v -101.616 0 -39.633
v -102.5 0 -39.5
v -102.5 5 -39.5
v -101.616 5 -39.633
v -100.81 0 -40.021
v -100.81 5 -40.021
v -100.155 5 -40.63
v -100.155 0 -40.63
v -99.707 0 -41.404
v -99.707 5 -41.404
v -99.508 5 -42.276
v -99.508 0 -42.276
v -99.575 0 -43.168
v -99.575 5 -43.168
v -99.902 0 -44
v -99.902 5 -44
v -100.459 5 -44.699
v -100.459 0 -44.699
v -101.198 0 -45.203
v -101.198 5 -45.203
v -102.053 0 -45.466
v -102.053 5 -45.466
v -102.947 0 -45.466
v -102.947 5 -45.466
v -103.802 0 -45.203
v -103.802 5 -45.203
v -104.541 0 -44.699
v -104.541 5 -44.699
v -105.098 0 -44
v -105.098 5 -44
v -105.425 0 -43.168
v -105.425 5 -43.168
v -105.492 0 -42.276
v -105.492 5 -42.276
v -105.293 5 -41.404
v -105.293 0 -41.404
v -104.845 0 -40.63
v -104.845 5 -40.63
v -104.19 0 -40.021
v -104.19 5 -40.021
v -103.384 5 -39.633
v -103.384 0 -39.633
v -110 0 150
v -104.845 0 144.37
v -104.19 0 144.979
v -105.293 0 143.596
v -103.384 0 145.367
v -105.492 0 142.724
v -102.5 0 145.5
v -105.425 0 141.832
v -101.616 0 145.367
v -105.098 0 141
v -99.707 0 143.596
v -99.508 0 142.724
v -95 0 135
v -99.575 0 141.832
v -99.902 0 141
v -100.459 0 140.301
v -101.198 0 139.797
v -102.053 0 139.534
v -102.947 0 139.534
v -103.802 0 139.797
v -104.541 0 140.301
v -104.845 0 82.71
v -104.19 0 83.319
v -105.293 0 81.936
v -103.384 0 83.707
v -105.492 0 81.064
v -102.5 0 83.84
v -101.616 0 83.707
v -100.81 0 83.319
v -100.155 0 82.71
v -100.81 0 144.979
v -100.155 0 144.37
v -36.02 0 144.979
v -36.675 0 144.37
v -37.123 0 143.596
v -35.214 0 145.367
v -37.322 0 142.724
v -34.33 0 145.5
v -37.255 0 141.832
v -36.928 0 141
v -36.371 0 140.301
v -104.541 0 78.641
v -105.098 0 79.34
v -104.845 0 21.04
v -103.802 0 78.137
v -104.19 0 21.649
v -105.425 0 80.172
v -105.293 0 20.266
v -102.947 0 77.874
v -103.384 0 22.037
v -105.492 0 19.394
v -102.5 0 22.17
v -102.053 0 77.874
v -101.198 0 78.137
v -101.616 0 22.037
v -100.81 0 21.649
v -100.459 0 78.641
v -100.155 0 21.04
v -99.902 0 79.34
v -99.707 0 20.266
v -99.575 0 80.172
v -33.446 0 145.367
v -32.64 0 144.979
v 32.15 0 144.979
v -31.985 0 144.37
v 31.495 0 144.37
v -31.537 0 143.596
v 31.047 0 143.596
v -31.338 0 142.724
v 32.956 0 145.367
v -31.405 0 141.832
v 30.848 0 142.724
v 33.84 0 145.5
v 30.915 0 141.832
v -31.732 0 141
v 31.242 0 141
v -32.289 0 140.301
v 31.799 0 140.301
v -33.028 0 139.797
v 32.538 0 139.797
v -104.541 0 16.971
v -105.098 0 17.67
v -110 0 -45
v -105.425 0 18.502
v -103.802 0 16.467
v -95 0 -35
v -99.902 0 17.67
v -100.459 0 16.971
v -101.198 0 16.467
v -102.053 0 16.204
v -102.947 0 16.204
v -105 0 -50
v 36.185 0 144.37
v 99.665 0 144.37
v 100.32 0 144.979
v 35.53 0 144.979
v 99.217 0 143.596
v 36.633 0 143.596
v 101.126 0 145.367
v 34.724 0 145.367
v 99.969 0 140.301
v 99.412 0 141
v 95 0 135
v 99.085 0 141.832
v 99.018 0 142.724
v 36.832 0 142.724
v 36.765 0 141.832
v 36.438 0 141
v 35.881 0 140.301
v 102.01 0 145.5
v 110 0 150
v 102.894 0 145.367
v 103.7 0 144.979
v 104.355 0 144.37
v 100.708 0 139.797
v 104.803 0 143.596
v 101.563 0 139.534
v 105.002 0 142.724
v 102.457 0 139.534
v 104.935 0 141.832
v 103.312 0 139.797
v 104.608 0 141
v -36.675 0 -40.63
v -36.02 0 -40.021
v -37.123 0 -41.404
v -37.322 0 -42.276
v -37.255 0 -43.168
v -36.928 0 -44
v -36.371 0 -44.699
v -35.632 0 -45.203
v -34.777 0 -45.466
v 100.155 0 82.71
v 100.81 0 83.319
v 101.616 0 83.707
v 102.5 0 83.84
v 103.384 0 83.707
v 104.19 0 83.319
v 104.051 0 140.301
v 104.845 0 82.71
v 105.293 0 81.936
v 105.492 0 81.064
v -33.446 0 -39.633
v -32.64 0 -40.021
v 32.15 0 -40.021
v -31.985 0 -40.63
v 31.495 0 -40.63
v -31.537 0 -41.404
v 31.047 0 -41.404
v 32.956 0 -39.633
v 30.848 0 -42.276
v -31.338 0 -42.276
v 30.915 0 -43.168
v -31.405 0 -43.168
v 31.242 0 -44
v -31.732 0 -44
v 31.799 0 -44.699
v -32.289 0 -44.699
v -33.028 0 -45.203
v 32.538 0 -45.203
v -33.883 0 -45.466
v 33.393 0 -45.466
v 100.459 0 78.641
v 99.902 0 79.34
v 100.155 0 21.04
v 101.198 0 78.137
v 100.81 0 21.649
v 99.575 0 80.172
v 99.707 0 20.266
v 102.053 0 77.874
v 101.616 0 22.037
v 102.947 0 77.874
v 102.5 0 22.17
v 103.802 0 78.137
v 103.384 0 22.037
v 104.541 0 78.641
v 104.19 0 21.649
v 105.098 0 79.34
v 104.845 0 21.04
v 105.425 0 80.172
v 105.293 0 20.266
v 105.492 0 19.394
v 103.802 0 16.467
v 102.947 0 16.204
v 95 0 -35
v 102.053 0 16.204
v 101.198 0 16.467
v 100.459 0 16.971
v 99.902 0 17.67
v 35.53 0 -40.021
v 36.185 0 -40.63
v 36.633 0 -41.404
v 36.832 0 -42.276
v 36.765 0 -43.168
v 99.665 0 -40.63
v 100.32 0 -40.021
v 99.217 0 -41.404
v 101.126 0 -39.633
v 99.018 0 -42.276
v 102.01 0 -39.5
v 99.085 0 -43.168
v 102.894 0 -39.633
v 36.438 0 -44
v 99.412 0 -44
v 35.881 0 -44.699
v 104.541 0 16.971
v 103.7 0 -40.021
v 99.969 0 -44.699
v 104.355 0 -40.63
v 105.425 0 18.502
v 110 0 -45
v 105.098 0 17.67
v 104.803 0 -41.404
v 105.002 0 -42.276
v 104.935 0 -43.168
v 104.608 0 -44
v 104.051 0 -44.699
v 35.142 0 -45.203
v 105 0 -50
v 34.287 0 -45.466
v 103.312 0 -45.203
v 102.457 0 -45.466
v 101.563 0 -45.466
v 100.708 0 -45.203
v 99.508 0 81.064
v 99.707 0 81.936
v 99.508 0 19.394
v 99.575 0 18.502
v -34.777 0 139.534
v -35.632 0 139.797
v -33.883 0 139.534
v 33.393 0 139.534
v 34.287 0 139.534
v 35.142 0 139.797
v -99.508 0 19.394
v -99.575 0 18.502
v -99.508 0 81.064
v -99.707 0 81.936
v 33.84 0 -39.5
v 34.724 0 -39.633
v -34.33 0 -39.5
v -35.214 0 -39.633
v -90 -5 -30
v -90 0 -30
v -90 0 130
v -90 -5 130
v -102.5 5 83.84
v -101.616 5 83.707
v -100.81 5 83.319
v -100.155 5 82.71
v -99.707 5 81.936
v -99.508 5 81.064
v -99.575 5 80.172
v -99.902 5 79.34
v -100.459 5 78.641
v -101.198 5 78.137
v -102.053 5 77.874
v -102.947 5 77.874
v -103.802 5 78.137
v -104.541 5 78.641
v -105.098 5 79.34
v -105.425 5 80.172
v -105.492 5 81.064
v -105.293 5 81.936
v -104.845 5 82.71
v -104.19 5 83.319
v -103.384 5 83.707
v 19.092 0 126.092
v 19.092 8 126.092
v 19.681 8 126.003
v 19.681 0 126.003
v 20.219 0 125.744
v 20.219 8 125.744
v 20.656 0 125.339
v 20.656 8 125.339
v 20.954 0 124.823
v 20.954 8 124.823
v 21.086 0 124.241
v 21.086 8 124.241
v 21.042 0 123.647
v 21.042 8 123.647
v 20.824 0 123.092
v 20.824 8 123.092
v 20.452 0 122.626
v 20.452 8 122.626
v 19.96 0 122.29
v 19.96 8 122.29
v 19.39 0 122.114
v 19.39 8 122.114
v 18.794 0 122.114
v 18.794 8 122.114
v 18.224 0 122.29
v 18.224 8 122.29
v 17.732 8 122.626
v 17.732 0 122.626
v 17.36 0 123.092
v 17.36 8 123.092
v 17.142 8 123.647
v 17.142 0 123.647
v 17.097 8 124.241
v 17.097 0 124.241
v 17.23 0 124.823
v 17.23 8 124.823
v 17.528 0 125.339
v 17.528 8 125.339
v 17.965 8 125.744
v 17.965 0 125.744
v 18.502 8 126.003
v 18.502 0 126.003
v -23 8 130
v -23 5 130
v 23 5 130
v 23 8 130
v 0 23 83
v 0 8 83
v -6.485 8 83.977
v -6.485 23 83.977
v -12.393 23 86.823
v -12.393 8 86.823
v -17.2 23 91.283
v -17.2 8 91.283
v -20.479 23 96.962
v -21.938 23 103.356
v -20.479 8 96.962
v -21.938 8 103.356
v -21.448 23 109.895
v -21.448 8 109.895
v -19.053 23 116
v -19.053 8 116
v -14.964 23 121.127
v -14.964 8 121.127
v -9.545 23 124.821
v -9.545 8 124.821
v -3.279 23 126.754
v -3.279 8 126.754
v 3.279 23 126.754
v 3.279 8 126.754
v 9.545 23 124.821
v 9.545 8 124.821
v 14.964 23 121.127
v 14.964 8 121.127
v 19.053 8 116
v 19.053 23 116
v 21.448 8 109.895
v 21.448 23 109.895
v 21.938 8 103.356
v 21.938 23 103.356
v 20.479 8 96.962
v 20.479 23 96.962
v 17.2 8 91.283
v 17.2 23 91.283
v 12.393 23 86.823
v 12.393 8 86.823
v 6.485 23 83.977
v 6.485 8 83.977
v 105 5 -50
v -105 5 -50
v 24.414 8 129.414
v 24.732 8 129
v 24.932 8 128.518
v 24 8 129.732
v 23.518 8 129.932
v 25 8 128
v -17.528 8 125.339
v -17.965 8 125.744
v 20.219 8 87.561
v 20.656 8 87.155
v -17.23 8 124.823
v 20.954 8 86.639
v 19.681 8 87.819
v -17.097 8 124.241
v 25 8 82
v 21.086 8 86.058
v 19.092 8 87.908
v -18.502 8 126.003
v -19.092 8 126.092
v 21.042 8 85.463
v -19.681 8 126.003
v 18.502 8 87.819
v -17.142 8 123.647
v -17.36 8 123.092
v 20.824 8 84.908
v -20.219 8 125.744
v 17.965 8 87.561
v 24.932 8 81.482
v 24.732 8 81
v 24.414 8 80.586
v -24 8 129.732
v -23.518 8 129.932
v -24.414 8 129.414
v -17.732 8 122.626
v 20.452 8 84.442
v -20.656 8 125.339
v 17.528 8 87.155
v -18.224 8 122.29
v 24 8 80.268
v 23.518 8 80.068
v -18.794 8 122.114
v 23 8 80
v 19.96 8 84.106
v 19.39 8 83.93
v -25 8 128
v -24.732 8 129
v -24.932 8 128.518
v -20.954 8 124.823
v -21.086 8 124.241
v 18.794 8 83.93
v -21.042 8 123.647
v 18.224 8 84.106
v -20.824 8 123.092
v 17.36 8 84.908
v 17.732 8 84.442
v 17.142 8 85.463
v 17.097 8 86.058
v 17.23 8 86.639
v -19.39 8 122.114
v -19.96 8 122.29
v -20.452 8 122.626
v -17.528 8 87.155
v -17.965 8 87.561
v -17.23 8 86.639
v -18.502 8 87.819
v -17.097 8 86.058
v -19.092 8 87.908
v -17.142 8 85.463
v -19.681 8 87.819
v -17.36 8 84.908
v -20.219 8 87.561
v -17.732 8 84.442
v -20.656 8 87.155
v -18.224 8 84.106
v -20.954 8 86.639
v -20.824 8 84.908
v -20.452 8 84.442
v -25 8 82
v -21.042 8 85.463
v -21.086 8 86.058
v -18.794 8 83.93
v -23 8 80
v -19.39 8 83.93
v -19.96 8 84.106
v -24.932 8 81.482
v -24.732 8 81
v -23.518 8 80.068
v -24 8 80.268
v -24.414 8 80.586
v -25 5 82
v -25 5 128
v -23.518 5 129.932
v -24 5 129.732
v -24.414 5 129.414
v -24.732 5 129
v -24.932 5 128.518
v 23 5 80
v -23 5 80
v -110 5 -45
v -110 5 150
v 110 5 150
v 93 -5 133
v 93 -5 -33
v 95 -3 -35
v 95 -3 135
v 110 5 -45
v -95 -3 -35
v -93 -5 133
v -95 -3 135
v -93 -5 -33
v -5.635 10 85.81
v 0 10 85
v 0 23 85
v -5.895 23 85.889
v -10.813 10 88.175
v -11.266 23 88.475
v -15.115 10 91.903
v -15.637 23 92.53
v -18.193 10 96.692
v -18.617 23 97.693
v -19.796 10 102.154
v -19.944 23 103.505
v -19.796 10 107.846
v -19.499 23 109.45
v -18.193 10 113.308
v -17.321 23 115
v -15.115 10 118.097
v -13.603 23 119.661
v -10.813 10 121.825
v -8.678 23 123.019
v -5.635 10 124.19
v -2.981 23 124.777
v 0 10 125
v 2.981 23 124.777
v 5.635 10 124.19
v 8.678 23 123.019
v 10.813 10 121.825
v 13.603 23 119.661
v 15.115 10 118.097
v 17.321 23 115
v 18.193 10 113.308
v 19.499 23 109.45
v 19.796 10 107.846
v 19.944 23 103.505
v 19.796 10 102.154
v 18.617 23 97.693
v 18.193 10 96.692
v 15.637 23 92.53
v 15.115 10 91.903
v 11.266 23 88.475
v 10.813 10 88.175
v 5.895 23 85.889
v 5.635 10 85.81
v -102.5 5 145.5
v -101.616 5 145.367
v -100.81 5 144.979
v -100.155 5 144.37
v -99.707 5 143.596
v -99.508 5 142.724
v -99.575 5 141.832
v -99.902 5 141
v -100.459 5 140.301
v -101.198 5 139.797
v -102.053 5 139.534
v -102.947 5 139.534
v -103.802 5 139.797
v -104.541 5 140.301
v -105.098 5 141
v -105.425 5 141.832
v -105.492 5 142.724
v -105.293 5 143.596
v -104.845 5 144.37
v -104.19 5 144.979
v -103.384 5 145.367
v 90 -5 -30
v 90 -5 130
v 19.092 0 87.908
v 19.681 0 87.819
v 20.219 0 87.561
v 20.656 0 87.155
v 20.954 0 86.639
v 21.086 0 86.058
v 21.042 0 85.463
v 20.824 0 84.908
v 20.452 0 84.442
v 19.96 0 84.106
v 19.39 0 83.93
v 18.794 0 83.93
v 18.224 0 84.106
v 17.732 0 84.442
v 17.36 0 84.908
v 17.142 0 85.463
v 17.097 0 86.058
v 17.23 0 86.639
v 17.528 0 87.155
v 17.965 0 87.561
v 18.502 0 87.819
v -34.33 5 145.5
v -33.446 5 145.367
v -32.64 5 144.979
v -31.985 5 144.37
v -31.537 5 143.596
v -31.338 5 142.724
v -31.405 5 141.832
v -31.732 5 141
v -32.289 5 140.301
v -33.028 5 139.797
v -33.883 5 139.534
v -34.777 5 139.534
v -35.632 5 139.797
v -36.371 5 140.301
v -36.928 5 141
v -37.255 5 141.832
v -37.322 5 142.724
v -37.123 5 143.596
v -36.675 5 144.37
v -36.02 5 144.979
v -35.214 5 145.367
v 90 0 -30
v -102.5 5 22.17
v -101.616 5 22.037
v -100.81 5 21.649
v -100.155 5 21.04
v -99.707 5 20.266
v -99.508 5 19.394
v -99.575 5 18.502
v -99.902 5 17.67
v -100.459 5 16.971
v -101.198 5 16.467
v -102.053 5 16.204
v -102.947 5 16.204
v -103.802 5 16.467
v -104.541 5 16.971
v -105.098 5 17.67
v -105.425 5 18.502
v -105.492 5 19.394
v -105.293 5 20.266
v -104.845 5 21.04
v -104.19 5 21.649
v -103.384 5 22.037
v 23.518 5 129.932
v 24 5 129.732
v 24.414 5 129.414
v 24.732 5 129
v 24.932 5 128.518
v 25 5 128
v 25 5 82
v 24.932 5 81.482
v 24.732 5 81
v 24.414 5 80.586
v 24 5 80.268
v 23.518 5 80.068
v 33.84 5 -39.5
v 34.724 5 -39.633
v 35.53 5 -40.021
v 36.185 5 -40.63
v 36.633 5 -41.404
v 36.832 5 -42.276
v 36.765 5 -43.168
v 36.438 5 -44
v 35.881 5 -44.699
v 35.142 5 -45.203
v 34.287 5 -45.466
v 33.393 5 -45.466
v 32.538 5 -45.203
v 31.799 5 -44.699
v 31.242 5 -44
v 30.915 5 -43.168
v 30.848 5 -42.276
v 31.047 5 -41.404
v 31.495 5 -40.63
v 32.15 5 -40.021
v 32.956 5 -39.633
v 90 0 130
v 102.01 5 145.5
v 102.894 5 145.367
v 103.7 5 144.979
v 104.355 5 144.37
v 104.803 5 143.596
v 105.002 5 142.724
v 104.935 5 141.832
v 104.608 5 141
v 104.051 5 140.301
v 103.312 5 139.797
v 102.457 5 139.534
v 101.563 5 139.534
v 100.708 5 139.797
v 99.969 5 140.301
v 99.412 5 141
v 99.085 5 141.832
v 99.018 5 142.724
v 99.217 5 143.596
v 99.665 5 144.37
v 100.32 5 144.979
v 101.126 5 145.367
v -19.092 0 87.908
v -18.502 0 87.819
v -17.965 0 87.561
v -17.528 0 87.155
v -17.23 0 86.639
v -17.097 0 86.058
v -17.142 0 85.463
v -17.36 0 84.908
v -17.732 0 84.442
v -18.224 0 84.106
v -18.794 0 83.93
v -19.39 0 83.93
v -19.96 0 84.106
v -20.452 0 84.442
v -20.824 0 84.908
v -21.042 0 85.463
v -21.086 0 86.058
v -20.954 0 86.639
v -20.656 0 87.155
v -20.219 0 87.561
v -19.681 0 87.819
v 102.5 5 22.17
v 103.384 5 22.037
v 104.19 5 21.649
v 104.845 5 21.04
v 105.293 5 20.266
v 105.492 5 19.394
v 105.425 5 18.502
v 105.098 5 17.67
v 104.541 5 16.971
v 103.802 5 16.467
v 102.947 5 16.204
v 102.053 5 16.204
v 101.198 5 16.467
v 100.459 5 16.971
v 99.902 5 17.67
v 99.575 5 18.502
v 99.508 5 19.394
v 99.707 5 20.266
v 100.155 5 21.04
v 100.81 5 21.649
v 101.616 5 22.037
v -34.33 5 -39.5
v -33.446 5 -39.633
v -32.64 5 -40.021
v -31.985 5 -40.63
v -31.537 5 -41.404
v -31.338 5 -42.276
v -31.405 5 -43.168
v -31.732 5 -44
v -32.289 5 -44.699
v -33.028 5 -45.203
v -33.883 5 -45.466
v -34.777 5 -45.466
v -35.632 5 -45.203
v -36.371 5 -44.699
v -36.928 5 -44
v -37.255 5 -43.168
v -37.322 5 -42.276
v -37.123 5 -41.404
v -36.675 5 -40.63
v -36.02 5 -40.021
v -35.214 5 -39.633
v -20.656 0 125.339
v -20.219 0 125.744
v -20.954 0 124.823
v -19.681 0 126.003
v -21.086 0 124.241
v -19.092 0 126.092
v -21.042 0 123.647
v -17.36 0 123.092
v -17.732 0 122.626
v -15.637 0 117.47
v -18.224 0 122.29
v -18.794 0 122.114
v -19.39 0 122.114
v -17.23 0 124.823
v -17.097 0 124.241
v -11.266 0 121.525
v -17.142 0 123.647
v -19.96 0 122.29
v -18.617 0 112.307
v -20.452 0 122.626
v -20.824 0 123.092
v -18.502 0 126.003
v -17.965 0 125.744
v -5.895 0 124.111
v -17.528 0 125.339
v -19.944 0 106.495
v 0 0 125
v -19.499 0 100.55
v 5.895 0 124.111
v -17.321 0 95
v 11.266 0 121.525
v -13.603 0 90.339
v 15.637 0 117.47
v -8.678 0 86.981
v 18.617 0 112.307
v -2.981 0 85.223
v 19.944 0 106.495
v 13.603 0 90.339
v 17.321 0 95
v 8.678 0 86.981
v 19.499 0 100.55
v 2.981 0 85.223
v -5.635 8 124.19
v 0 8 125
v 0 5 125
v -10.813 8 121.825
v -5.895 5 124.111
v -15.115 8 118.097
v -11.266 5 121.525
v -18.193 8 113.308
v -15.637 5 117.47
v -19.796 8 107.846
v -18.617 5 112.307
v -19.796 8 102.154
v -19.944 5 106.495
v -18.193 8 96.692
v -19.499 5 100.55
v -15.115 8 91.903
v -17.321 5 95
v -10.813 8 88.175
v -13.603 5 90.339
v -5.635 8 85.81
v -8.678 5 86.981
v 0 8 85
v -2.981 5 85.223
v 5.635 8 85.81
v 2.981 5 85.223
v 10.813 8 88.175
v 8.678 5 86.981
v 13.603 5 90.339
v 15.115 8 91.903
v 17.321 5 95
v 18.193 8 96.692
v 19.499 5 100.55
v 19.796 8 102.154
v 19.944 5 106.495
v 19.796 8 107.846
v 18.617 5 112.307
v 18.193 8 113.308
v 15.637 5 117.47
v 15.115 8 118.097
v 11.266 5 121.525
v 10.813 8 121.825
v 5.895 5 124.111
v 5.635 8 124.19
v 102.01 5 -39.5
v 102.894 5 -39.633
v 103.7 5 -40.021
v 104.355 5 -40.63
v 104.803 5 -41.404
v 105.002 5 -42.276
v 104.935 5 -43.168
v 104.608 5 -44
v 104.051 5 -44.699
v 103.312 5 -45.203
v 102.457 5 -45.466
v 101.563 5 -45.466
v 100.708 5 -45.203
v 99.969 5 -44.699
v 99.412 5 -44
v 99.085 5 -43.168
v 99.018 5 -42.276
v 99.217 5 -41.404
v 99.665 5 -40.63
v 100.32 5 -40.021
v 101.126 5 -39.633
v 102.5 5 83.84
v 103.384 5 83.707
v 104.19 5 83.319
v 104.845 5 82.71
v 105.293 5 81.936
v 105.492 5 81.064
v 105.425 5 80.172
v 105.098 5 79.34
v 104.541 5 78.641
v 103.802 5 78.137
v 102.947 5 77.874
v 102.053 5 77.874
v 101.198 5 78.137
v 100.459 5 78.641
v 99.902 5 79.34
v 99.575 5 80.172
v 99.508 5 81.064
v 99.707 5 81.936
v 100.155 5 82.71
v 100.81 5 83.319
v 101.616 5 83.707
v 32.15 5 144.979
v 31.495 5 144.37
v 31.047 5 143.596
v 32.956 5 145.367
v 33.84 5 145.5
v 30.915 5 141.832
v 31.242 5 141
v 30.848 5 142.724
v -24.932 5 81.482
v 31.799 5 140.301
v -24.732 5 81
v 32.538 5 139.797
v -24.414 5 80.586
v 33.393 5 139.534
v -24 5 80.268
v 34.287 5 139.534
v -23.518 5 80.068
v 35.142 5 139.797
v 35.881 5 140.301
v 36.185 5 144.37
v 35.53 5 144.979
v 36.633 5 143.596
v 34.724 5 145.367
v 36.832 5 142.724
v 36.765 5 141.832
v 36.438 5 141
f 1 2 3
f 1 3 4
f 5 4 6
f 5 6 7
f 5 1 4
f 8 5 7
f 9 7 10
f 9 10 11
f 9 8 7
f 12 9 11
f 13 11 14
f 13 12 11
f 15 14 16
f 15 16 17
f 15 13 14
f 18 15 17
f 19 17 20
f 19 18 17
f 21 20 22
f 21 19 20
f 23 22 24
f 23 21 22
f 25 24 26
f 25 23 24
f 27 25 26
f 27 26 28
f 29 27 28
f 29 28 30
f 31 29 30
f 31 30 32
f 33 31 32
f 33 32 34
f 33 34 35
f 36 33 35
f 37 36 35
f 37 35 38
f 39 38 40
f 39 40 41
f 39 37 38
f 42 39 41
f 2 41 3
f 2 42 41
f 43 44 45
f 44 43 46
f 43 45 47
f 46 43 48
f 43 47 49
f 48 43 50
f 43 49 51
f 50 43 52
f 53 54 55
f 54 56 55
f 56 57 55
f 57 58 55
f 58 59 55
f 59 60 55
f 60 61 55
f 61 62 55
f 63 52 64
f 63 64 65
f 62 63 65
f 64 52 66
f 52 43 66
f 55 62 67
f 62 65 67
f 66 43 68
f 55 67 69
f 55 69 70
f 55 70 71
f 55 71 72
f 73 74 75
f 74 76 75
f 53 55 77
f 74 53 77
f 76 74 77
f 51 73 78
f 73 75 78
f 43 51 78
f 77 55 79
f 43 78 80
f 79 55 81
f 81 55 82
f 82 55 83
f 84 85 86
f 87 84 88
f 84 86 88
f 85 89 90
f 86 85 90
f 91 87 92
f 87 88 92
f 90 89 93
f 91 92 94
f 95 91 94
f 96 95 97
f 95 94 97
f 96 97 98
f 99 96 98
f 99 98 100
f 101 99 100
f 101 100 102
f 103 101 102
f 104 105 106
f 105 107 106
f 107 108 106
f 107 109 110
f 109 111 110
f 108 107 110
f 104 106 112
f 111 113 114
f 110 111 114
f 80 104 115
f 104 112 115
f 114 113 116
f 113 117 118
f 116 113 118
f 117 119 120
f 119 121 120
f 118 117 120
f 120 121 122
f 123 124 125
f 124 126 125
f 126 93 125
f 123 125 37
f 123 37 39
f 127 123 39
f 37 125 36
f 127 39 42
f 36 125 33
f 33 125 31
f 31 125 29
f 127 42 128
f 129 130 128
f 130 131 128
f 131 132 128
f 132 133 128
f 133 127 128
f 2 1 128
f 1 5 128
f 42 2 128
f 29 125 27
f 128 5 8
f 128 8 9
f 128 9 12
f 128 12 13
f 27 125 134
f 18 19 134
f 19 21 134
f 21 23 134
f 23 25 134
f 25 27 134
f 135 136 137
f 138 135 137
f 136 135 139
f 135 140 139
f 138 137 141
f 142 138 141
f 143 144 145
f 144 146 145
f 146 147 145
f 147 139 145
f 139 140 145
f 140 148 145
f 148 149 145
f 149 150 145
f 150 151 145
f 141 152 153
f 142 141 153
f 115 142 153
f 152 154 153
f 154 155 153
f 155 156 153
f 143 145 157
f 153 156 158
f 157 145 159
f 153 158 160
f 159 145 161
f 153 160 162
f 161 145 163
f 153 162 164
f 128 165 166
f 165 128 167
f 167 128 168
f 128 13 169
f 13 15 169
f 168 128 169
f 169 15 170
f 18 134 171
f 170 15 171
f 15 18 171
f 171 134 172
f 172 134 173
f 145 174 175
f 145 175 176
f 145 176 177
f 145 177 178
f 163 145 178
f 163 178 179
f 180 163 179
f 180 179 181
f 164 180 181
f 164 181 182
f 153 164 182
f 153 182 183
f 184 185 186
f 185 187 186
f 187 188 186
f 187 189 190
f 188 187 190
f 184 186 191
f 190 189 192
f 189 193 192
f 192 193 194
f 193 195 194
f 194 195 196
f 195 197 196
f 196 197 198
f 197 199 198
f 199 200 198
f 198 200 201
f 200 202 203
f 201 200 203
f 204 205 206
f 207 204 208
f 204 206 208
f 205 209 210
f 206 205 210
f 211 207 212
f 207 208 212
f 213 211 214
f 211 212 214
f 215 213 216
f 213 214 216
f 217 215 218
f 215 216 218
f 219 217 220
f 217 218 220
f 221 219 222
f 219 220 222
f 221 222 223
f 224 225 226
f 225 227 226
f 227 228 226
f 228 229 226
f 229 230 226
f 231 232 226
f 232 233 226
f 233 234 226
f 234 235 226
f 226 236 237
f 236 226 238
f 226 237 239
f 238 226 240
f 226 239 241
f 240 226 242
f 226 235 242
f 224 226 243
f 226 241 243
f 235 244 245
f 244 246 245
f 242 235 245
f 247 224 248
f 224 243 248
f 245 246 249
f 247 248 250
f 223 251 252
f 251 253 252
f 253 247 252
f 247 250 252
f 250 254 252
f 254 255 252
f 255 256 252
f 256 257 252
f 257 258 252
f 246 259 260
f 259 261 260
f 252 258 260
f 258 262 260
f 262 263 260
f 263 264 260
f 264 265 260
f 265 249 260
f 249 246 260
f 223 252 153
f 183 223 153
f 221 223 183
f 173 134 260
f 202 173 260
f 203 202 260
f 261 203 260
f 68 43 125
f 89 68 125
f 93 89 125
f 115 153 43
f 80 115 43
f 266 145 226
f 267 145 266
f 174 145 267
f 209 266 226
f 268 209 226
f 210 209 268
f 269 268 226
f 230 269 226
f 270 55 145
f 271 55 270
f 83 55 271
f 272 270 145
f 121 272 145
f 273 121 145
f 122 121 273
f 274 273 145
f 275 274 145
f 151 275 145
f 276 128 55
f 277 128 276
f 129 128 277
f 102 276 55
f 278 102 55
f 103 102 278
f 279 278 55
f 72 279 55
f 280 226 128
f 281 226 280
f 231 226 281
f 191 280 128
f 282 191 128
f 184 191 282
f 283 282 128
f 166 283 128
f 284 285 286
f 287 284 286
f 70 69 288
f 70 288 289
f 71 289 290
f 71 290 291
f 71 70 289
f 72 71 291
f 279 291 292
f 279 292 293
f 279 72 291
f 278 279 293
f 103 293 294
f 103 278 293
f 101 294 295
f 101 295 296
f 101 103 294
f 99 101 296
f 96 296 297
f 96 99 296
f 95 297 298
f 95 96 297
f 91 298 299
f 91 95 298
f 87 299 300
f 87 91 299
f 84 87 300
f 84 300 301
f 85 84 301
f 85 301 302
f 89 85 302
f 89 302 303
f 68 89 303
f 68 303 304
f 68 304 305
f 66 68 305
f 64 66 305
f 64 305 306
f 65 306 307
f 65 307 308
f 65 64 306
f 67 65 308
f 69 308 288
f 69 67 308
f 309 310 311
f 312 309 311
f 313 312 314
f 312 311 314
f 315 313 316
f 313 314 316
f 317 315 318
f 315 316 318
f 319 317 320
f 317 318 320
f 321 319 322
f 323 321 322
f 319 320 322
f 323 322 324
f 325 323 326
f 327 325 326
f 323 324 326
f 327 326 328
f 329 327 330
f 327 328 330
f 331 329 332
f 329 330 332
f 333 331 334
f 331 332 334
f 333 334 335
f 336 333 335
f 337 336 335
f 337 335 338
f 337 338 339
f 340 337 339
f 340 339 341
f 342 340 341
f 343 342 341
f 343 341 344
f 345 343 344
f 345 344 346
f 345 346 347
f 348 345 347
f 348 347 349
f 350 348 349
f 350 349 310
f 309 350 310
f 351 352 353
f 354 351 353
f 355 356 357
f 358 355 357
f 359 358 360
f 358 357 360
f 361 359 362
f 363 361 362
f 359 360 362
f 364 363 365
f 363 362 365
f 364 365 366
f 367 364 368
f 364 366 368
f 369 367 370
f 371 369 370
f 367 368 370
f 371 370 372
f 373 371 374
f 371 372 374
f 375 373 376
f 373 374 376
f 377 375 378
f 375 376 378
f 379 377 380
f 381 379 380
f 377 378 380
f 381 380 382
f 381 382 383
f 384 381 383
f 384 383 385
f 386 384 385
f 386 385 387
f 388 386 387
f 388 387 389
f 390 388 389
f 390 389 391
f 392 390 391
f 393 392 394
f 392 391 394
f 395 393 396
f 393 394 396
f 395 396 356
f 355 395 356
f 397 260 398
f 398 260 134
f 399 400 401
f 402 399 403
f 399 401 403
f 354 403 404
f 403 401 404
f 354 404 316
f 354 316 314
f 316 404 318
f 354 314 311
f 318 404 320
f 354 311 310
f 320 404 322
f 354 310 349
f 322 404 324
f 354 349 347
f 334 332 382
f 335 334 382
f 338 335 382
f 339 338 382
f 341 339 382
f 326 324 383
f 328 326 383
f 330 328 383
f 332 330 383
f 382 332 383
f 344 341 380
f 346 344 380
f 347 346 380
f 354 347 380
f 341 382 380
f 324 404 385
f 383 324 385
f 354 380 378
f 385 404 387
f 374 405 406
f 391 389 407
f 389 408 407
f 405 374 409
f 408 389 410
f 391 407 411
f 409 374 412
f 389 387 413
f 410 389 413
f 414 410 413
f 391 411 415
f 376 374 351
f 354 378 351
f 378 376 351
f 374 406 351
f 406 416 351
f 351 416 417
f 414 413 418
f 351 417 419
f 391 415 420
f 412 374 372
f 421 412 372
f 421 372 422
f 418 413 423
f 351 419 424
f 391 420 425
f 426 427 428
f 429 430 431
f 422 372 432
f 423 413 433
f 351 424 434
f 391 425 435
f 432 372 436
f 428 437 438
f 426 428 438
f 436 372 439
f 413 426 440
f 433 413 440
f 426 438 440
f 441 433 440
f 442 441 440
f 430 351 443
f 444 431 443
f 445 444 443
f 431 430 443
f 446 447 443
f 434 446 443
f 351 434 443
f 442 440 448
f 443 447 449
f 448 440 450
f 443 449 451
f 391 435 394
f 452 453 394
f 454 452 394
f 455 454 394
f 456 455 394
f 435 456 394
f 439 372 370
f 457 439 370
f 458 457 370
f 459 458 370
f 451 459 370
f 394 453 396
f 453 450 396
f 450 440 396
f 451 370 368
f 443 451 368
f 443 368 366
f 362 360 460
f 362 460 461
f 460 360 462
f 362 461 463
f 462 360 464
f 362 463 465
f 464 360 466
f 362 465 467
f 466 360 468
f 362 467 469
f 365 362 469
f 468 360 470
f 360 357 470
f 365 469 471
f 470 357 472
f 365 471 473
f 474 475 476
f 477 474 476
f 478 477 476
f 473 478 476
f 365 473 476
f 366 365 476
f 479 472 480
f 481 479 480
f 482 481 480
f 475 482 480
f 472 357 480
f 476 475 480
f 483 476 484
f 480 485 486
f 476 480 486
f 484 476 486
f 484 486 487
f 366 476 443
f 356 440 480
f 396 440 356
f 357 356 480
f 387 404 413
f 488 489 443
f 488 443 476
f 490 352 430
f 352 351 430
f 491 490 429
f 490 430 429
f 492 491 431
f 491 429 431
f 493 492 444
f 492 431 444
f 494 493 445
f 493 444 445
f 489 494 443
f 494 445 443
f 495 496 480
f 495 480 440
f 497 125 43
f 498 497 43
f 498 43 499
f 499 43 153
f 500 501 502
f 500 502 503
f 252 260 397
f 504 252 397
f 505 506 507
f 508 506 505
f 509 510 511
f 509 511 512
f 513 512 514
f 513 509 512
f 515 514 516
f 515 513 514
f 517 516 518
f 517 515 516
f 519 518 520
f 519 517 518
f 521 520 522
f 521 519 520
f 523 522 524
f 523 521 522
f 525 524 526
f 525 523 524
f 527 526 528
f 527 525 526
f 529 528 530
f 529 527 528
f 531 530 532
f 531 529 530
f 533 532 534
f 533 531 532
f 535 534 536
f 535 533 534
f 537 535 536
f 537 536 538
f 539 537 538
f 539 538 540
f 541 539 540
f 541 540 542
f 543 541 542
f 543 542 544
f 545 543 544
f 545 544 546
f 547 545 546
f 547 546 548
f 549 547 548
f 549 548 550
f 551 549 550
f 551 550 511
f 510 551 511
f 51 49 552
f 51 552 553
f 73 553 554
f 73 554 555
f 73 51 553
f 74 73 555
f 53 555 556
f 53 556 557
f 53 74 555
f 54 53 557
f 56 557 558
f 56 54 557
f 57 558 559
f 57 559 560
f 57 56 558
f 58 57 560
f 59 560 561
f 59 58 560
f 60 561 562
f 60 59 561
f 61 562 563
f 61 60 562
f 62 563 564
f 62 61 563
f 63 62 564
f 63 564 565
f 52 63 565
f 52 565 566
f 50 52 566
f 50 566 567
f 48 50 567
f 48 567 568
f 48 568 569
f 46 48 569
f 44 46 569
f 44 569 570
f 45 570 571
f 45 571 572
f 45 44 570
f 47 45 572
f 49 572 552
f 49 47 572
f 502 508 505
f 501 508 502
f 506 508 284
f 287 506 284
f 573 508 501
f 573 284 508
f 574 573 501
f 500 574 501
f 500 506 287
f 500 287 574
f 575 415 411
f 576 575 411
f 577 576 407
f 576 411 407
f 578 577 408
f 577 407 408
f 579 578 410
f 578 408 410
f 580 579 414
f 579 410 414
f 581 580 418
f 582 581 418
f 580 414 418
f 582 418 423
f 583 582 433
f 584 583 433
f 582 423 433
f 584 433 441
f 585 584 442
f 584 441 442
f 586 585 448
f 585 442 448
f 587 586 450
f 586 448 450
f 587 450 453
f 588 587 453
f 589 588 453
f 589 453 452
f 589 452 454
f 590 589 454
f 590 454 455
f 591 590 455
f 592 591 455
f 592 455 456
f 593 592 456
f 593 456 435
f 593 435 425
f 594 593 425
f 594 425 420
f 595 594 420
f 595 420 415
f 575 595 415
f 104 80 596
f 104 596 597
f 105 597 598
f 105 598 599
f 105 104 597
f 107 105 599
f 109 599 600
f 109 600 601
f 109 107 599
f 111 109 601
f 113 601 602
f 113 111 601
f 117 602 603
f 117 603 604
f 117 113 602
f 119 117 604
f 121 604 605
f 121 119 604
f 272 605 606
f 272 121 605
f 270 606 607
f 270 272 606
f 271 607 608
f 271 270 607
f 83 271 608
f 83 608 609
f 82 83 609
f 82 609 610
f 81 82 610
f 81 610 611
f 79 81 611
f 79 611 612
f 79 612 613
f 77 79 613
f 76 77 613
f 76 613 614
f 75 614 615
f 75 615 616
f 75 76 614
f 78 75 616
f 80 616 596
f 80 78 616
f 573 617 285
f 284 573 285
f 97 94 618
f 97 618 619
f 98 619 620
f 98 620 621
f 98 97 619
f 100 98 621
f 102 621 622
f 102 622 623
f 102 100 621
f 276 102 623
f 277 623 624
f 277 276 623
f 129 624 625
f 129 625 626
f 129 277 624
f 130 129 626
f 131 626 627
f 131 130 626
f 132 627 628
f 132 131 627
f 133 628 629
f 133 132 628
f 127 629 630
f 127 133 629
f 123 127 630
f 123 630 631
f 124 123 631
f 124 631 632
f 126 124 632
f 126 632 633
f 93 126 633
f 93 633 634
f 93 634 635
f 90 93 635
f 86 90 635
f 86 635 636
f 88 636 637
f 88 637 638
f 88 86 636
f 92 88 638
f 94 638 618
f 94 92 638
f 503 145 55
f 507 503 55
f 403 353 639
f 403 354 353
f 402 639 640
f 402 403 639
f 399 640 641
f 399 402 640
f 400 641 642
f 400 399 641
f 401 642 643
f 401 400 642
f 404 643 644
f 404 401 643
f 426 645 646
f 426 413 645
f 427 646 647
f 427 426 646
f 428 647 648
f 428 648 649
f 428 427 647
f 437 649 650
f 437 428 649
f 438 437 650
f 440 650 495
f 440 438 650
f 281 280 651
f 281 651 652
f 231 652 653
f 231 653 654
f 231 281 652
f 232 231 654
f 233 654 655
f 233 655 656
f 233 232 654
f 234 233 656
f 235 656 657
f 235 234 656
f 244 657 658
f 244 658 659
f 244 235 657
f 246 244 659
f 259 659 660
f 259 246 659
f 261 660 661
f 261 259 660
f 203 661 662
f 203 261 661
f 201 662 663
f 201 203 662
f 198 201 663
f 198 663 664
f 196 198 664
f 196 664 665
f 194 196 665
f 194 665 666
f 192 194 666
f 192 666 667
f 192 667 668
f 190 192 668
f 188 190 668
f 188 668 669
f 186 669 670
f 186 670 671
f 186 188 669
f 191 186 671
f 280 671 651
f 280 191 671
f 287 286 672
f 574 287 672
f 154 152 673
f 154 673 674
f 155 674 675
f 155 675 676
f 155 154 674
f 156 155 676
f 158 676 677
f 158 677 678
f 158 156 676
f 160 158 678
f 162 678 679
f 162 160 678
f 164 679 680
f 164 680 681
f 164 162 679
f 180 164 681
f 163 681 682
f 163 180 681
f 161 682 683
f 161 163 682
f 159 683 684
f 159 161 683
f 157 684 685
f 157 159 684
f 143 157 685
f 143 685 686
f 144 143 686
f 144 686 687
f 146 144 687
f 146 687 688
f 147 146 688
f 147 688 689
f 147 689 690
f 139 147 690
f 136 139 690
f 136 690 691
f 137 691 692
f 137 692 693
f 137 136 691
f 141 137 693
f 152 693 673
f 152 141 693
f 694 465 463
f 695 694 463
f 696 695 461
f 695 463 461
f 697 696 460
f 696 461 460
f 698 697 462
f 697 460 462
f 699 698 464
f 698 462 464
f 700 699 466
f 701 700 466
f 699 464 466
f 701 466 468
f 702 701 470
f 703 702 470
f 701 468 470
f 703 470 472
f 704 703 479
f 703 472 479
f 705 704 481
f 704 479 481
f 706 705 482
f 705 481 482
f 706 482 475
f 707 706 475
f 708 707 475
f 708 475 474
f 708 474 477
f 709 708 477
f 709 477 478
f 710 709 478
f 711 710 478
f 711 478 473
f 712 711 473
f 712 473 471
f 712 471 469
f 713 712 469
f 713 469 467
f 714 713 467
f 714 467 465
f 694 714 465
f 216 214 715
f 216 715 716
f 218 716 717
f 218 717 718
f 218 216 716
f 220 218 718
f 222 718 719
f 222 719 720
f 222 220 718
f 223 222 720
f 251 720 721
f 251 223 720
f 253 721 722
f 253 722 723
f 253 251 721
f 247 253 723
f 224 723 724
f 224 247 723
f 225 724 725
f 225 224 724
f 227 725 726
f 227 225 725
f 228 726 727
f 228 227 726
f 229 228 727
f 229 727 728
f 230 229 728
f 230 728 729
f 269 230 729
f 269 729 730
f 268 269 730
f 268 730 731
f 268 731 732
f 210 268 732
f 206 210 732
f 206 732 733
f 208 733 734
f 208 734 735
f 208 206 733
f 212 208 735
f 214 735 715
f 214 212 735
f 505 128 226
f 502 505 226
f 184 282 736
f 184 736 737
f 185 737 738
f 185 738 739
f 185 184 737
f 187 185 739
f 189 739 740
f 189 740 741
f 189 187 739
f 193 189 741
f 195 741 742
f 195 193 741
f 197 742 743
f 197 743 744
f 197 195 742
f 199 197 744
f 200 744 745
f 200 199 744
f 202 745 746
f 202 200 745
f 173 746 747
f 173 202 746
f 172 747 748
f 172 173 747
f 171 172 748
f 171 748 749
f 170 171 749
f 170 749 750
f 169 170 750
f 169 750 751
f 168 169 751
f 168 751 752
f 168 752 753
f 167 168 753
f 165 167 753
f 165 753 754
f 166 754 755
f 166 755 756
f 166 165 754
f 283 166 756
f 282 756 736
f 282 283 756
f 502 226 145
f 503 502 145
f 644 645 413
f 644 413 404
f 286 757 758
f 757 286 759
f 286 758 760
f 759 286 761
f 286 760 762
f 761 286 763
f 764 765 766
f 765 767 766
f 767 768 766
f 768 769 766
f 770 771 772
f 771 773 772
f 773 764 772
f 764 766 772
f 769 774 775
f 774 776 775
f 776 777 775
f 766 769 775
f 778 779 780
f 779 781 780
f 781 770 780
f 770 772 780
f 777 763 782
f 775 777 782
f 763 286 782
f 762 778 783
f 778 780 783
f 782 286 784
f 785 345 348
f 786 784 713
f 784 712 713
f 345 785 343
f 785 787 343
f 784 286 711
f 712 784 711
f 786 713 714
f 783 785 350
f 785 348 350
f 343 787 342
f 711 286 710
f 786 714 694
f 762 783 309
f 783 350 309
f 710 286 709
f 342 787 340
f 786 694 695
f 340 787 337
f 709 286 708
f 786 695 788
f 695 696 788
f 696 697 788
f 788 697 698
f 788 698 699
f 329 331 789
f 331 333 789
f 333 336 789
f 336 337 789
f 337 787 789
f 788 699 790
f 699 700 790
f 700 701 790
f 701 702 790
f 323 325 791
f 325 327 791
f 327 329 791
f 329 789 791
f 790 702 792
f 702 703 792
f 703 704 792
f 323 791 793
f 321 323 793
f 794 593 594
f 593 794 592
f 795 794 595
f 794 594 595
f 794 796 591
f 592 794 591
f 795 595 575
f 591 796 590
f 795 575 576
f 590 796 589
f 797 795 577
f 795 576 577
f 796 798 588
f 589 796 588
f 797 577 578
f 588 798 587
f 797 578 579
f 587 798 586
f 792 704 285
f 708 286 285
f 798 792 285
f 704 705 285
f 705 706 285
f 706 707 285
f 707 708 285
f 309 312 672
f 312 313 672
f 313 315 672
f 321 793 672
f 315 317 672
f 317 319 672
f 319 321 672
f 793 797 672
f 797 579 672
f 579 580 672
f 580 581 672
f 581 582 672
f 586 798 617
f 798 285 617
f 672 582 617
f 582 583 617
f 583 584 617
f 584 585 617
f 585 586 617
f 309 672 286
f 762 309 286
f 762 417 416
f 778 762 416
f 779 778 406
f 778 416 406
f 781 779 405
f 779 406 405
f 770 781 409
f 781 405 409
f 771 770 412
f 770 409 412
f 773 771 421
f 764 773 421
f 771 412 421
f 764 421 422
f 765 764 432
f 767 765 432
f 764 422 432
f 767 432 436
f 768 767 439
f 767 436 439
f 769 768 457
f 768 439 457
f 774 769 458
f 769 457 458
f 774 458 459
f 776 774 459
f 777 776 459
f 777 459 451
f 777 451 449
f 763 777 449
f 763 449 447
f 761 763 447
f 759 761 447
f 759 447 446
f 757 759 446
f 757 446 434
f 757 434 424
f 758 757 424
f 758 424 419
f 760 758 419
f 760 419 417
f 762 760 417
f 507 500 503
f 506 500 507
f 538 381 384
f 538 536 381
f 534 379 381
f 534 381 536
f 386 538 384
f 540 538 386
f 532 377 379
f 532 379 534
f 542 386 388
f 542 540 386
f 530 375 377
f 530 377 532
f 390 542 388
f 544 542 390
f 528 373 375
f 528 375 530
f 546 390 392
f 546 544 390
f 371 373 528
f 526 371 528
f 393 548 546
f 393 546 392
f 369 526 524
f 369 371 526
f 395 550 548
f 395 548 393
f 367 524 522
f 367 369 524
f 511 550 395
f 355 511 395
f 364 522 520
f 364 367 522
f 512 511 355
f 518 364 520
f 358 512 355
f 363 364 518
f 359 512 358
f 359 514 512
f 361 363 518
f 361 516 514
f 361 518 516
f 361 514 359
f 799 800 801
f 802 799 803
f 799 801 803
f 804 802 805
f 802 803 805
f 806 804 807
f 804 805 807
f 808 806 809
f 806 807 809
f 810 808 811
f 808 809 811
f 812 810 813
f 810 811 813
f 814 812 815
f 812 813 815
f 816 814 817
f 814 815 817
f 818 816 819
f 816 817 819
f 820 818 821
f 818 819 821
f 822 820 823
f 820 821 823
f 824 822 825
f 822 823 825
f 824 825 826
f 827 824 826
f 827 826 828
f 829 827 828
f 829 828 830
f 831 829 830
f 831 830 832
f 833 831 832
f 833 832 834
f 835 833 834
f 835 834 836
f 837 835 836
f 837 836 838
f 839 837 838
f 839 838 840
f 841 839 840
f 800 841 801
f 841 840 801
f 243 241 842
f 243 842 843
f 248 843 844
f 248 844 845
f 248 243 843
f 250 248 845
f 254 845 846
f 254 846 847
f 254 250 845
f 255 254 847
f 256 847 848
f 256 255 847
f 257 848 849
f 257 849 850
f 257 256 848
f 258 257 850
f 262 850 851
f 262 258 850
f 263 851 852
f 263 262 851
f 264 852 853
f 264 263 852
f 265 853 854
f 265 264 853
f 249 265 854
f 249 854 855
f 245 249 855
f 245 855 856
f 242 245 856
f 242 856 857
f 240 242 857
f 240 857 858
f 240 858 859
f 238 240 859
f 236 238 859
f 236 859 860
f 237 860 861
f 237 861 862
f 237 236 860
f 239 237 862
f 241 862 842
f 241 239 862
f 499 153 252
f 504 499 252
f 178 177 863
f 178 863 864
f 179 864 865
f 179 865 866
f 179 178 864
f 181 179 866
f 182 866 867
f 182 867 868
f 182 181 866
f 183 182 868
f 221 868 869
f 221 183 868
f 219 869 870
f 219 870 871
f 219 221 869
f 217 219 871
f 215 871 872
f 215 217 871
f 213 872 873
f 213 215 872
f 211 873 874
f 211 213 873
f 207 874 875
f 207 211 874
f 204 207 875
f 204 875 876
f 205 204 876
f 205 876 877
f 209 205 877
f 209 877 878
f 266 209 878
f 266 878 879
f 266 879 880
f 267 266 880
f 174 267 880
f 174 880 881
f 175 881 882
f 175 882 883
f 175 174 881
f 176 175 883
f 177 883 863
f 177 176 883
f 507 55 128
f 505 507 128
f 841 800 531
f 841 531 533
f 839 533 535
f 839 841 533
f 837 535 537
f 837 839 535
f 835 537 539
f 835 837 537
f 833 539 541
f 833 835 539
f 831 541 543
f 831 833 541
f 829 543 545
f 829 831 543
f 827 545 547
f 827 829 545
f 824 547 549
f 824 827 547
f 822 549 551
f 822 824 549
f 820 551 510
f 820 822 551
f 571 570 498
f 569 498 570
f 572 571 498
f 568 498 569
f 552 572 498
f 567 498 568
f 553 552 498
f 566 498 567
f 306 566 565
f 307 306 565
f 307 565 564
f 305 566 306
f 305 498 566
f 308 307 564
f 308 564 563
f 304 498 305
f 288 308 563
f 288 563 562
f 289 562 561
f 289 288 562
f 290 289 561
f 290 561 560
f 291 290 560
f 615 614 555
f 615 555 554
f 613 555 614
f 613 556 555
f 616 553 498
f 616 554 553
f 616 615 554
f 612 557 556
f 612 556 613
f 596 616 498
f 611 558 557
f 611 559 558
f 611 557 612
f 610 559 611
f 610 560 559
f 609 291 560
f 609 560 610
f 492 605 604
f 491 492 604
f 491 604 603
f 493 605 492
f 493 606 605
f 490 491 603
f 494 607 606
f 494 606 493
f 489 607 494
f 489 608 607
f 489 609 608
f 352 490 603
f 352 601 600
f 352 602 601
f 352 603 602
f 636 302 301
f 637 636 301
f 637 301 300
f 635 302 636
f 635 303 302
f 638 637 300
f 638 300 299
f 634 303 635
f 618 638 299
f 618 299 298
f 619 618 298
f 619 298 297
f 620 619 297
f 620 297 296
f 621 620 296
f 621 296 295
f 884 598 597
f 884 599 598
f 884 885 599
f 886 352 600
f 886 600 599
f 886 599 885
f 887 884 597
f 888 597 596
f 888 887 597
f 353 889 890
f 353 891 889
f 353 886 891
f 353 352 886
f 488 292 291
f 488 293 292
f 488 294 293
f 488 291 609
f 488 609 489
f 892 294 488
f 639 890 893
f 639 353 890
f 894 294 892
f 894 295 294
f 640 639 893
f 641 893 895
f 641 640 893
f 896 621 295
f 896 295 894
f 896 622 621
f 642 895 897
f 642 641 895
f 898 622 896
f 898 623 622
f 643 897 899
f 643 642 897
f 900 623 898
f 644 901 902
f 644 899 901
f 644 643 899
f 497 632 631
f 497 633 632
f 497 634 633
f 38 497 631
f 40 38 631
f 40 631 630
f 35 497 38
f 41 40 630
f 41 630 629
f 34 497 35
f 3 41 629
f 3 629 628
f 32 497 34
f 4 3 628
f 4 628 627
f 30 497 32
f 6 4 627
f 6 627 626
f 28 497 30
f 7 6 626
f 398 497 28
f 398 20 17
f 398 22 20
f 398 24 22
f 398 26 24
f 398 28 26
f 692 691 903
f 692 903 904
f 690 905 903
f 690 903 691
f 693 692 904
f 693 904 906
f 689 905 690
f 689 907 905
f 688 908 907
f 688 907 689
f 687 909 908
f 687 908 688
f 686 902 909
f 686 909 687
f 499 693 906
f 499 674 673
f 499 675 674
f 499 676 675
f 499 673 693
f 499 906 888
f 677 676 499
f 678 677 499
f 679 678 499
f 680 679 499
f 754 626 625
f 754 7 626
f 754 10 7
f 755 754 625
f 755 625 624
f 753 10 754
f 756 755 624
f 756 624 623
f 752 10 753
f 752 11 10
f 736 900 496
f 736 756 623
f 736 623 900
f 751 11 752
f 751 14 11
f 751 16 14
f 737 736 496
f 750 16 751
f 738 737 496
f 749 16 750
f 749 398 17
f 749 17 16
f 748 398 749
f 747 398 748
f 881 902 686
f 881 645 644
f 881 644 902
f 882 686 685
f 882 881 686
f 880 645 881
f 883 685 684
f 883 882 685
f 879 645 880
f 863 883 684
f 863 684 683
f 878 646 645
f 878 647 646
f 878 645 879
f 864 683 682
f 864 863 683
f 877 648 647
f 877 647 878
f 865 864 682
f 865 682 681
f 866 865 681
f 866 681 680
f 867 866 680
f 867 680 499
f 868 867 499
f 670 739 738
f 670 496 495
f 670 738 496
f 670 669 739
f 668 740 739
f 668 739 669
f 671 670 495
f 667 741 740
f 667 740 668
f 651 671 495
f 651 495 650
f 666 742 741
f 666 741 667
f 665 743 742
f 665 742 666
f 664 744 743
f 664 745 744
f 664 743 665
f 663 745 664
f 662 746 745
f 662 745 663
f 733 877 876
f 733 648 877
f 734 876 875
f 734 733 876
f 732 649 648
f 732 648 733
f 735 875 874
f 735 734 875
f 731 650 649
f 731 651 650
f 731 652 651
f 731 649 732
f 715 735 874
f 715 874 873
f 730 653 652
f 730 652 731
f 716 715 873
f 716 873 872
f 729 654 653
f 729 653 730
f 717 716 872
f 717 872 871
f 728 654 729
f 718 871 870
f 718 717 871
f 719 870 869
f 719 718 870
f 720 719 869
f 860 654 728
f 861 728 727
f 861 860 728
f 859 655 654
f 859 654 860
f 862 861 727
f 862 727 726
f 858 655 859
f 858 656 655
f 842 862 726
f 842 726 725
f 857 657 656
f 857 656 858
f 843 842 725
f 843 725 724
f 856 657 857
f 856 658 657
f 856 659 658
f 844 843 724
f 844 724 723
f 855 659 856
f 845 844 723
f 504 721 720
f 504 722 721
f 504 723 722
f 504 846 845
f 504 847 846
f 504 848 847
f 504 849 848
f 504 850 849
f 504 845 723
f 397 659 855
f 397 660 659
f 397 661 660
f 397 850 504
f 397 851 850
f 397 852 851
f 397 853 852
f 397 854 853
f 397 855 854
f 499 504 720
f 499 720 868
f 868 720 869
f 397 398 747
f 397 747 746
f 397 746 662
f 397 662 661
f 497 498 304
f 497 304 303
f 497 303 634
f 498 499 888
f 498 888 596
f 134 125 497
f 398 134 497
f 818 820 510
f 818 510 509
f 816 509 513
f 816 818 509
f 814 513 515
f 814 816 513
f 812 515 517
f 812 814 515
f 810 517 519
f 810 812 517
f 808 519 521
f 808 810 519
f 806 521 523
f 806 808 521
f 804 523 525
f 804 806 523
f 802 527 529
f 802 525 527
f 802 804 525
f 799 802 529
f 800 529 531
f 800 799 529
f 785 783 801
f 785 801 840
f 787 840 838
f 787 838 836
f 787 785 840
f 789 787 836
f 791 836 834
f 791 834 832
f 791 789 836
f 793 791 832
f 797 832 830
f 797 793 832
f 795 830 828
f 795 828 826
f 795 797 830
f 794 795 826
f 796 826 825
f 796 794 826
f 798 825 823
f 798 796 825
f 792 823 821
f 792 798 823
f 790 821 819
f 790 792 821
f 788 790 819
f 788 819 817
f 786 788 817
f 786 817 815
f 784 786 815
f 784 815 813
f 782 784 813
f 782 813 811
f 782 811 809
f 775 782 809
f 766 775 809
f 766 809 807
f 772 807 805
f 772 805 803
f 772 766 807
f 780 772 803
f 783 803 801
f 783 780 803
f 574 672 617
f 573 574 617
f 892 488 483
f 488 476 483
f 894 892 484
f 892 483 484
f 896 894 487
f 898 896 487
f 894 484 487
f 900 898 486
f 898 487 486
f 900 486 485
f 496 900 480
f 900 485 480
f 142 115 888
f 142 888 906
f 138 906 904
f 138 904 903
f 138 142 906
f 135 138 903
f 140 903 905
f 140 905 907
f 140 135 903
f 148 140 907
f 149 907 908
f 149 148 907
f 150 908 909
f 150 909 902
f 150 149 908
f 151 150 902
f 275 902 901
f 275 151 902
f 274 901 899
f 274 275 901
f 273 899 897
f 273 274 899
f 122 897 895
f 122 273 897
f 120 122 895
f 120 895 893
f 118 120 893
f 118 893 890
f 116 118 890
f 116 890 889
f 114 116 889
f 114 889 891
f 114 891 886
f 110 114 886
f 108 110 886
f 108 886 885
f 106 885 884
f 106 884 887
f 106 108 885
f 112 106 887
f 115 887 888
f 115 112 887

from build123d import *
from build123d.topology import SkipClean

# Parameters (mm, degrees)
SKETCH1_R           = 3
SKETCH1_R_2         = 20
BOSS_EXTRUDE1_DEPTH = 5
CHAMFER1_SIZE       = 5
BOSS_EXTRUDE3_DEPTH = 3
SKETCH3_R           = 22
SKETCH3_R_2         = 20
BOSS_EXTRUDE4_DEPTH = 15
FILLET2_R           = 2
BOSS_EXTRUDE5_DEPTH = 5
SKETCH6_R           = 20
CUT_EXTRUDE1_DEPTH  = 5
SKETCH7_R           = 2
CUT_EXTRUDE2_DEPTH  = 10
CHAMFER2_SIZE       = 2


with BuildPart() as part:
    # Sketch1 → Boss-Extrude1 (new body)
    with BuildSketch(Plane(origin=(0, 0, 0), x_dir=(1, 0, 0), z_dir=(0, 1, 0))):
        Polygon((110, -150), (110, 50), (0, 50), (-110, 50), (-110, -150), align=None)
        with Locations(Location((-102.5, 42.5, 0), (0, 0, 270))):
            Circle(SKETCH1_R, mode=Mode.SUBTRACT)
        with Locations(Location((-34.33, 42.5, 0), (0, 0, 270))):
            Circle(SKETCH1_R, mode=Mode.SUBTRACT)
        with Locations(Location((33.84, 42.5, 0), (0, 0, 270))):
            Circle(SKETCH1_R, mode=Mode.SUBTRACT)
        with Locations(Location((102.01, 42.5, 0), (0, 0, 270))):
            Circle(SKETCH1_R, mode=Mode.SUBTRACT)
        with Locations(Location((-34.33, -142.5, 0), (0, 0, 270))):
            Circle(SKETCH1_R, mode=Mode.SUBTRACT)
        with Locations(Location((33.84, -142.5, 0), (0, 0, 270))):
            Circle(SKETCH1_R, mode=Mode.SUBTRACT)
        with Locations(Location((102.01, -142.5, 0), (0, 0, 270))):
            Circle(SKETCH1_R, mode=Mode.SUBTRACT)
        with Locations(Location((-102.5, -142.5, 0), (0, 0, 270))):
            Circle(SKETCH1_R, mode=Mode.SUBTRACT)
        with Locations(Location((-102.5, -19.17, 0), (0, 0, 270))):
            Circle(SKETCH1_R, mode=Mode.SUBTRACT)
        with Locations(Location((-102.5, -80.84, 0), (0, 0, 270))):
            Circle(SKETCH1_R, mode=Mode.SUBTRACT)
        with Locations(Location((102.5, -19.17, 0), (0, 0, 270))):
            Circle(SKETCH1_R, mode=Mode.SUBTRACT)
        with Locations(Location((102.5, -80.84, 0), (0, 0, 270))):
            Circle(SKETCH1_R, mode=Mode.SUBTRACT)
        with Locations(Location((0, -105, 0), (0, 0, 270))):
            Circle(SKETCH1_R_2, mode=Mode.SUBTRACT)
    extrude(amount=BOSS_EXTRUDE1_DEPTH)

    # Chamfer1
    chamfer1_edges = [part.edges().sort_by_distance(p)[0] for p in [
        (110, 2.5, -50),
        (-110, 2.5, -50),
    ]]
    chamfer(chamfer1_edges, length=CHAMFER1_SIZE)

    # Sketch2 → Boss-Extrude3 (add)
    with BuildSketch(Plane(origin=(0, 5, 0), x_dir=(1, 0, 0), z_dir=(0, 1, 0))):
        Polygon((0, -130), (-25, -130), (-25, -80), (25, -80), (25, -130), align=None)
    extrude(amount=BOSS_EXTRUDE3_DEPTH)

    # Sketch3 → Boss-Extrude4 (add)
    with BuildSketch(Plane(origin=(0, 8, 0), x_dir=(1, 0, 0), z_dir=(0, 1, 0))):
        with Locations(Location((0, -105, 0), (0, 0, 90))):
            Circle(SKETCH3_R)
        with Locations(Location((0, -105, 0), (0, 0, 90))):
            Circle(SKETCH3_R_2, mode=Mode.SUBTRACT)
    extrude(amount=BOSS_EXTRUDE4_DEPTH)

    # Fillet2
    fillet2_edges = [part.edges().sort_by_distance(p)[0] for p in [
        (-25, 6.5, 80),
        (-25, 6.5, 130),
        (25, 6.5, 130),
        (25, 6.5, 80),
    ]]
    fillet(fillet2_edges, radius=FILLET2_R)

    # Sketch4 → Boss-Extrude5 (add)
    with BuildSketch(Plane.XZ):
        Polygon((95, 135), (0, 135), (-95, 135), (-95, -35), (95, -35), align=None)
        Polygon((-90, 130), (0, 130), (90, 130), (90, -30), (-90, -30), align=None, mode=Mode.SUBTRACT)
    extrude(amount=BOSS_EXTRUDE5_DEPTH)

    # Sketch6 → Cut-Extrude1 (cut)
    with SkipClean():  # the faces are left unmerged after this step: merging them gives an invalid solid
        with BuildSketch(Plane.XZ.offset(-5)):
            with Locations(Location((0, 105, 0), (0, 0, 90))):
                Circle(SKETCH6_R)
        extrude(amount=-CUT_EXTRUDE1_DEPTH, mode=Mode.SUBTRACT)

    # Sketch7 → Cut-Extrude2 (cut)
    with BuildSketch(Plane(origin=(0, 8, 0), x_dir=(1, 0, 0), z_dir=(0, 1, 0))):
        with Locations(Location((19.091883092, -124.091883092, 0), (0, 0, 270))):
            Circle(SKETCH7_R)
        with Locations(Location((-19.091883092, -124.091883092, 0), (0, 0, 270))):
            Circle(SKETCH7_R)
        with Locations(Location((-19.091883092, -85.908116908, 0), (0, 0, 270))):
            Circle(SKETCH7_R)
        with Locations(Location((19.091883092, -85.908116908, 0), (0, 0, 270))):
            Circle(SKETCH7_R)
    extrude(amount=-CUT_EXTRUDE2_DEPTH, mode=Mode.SUBTRACT)

    # Chamfer2
    chamfer2_edges = [part.edges().sort_by_distance(p)[0] for p in [
        (0, -5, 135),
        (-95, -5, 50),
        (0, -5, -35),
        (95, -5, 50),
    ]]
    chamfer(chamfer2_edges, length=CHAMFER2_SIZE)


solid = part.part
